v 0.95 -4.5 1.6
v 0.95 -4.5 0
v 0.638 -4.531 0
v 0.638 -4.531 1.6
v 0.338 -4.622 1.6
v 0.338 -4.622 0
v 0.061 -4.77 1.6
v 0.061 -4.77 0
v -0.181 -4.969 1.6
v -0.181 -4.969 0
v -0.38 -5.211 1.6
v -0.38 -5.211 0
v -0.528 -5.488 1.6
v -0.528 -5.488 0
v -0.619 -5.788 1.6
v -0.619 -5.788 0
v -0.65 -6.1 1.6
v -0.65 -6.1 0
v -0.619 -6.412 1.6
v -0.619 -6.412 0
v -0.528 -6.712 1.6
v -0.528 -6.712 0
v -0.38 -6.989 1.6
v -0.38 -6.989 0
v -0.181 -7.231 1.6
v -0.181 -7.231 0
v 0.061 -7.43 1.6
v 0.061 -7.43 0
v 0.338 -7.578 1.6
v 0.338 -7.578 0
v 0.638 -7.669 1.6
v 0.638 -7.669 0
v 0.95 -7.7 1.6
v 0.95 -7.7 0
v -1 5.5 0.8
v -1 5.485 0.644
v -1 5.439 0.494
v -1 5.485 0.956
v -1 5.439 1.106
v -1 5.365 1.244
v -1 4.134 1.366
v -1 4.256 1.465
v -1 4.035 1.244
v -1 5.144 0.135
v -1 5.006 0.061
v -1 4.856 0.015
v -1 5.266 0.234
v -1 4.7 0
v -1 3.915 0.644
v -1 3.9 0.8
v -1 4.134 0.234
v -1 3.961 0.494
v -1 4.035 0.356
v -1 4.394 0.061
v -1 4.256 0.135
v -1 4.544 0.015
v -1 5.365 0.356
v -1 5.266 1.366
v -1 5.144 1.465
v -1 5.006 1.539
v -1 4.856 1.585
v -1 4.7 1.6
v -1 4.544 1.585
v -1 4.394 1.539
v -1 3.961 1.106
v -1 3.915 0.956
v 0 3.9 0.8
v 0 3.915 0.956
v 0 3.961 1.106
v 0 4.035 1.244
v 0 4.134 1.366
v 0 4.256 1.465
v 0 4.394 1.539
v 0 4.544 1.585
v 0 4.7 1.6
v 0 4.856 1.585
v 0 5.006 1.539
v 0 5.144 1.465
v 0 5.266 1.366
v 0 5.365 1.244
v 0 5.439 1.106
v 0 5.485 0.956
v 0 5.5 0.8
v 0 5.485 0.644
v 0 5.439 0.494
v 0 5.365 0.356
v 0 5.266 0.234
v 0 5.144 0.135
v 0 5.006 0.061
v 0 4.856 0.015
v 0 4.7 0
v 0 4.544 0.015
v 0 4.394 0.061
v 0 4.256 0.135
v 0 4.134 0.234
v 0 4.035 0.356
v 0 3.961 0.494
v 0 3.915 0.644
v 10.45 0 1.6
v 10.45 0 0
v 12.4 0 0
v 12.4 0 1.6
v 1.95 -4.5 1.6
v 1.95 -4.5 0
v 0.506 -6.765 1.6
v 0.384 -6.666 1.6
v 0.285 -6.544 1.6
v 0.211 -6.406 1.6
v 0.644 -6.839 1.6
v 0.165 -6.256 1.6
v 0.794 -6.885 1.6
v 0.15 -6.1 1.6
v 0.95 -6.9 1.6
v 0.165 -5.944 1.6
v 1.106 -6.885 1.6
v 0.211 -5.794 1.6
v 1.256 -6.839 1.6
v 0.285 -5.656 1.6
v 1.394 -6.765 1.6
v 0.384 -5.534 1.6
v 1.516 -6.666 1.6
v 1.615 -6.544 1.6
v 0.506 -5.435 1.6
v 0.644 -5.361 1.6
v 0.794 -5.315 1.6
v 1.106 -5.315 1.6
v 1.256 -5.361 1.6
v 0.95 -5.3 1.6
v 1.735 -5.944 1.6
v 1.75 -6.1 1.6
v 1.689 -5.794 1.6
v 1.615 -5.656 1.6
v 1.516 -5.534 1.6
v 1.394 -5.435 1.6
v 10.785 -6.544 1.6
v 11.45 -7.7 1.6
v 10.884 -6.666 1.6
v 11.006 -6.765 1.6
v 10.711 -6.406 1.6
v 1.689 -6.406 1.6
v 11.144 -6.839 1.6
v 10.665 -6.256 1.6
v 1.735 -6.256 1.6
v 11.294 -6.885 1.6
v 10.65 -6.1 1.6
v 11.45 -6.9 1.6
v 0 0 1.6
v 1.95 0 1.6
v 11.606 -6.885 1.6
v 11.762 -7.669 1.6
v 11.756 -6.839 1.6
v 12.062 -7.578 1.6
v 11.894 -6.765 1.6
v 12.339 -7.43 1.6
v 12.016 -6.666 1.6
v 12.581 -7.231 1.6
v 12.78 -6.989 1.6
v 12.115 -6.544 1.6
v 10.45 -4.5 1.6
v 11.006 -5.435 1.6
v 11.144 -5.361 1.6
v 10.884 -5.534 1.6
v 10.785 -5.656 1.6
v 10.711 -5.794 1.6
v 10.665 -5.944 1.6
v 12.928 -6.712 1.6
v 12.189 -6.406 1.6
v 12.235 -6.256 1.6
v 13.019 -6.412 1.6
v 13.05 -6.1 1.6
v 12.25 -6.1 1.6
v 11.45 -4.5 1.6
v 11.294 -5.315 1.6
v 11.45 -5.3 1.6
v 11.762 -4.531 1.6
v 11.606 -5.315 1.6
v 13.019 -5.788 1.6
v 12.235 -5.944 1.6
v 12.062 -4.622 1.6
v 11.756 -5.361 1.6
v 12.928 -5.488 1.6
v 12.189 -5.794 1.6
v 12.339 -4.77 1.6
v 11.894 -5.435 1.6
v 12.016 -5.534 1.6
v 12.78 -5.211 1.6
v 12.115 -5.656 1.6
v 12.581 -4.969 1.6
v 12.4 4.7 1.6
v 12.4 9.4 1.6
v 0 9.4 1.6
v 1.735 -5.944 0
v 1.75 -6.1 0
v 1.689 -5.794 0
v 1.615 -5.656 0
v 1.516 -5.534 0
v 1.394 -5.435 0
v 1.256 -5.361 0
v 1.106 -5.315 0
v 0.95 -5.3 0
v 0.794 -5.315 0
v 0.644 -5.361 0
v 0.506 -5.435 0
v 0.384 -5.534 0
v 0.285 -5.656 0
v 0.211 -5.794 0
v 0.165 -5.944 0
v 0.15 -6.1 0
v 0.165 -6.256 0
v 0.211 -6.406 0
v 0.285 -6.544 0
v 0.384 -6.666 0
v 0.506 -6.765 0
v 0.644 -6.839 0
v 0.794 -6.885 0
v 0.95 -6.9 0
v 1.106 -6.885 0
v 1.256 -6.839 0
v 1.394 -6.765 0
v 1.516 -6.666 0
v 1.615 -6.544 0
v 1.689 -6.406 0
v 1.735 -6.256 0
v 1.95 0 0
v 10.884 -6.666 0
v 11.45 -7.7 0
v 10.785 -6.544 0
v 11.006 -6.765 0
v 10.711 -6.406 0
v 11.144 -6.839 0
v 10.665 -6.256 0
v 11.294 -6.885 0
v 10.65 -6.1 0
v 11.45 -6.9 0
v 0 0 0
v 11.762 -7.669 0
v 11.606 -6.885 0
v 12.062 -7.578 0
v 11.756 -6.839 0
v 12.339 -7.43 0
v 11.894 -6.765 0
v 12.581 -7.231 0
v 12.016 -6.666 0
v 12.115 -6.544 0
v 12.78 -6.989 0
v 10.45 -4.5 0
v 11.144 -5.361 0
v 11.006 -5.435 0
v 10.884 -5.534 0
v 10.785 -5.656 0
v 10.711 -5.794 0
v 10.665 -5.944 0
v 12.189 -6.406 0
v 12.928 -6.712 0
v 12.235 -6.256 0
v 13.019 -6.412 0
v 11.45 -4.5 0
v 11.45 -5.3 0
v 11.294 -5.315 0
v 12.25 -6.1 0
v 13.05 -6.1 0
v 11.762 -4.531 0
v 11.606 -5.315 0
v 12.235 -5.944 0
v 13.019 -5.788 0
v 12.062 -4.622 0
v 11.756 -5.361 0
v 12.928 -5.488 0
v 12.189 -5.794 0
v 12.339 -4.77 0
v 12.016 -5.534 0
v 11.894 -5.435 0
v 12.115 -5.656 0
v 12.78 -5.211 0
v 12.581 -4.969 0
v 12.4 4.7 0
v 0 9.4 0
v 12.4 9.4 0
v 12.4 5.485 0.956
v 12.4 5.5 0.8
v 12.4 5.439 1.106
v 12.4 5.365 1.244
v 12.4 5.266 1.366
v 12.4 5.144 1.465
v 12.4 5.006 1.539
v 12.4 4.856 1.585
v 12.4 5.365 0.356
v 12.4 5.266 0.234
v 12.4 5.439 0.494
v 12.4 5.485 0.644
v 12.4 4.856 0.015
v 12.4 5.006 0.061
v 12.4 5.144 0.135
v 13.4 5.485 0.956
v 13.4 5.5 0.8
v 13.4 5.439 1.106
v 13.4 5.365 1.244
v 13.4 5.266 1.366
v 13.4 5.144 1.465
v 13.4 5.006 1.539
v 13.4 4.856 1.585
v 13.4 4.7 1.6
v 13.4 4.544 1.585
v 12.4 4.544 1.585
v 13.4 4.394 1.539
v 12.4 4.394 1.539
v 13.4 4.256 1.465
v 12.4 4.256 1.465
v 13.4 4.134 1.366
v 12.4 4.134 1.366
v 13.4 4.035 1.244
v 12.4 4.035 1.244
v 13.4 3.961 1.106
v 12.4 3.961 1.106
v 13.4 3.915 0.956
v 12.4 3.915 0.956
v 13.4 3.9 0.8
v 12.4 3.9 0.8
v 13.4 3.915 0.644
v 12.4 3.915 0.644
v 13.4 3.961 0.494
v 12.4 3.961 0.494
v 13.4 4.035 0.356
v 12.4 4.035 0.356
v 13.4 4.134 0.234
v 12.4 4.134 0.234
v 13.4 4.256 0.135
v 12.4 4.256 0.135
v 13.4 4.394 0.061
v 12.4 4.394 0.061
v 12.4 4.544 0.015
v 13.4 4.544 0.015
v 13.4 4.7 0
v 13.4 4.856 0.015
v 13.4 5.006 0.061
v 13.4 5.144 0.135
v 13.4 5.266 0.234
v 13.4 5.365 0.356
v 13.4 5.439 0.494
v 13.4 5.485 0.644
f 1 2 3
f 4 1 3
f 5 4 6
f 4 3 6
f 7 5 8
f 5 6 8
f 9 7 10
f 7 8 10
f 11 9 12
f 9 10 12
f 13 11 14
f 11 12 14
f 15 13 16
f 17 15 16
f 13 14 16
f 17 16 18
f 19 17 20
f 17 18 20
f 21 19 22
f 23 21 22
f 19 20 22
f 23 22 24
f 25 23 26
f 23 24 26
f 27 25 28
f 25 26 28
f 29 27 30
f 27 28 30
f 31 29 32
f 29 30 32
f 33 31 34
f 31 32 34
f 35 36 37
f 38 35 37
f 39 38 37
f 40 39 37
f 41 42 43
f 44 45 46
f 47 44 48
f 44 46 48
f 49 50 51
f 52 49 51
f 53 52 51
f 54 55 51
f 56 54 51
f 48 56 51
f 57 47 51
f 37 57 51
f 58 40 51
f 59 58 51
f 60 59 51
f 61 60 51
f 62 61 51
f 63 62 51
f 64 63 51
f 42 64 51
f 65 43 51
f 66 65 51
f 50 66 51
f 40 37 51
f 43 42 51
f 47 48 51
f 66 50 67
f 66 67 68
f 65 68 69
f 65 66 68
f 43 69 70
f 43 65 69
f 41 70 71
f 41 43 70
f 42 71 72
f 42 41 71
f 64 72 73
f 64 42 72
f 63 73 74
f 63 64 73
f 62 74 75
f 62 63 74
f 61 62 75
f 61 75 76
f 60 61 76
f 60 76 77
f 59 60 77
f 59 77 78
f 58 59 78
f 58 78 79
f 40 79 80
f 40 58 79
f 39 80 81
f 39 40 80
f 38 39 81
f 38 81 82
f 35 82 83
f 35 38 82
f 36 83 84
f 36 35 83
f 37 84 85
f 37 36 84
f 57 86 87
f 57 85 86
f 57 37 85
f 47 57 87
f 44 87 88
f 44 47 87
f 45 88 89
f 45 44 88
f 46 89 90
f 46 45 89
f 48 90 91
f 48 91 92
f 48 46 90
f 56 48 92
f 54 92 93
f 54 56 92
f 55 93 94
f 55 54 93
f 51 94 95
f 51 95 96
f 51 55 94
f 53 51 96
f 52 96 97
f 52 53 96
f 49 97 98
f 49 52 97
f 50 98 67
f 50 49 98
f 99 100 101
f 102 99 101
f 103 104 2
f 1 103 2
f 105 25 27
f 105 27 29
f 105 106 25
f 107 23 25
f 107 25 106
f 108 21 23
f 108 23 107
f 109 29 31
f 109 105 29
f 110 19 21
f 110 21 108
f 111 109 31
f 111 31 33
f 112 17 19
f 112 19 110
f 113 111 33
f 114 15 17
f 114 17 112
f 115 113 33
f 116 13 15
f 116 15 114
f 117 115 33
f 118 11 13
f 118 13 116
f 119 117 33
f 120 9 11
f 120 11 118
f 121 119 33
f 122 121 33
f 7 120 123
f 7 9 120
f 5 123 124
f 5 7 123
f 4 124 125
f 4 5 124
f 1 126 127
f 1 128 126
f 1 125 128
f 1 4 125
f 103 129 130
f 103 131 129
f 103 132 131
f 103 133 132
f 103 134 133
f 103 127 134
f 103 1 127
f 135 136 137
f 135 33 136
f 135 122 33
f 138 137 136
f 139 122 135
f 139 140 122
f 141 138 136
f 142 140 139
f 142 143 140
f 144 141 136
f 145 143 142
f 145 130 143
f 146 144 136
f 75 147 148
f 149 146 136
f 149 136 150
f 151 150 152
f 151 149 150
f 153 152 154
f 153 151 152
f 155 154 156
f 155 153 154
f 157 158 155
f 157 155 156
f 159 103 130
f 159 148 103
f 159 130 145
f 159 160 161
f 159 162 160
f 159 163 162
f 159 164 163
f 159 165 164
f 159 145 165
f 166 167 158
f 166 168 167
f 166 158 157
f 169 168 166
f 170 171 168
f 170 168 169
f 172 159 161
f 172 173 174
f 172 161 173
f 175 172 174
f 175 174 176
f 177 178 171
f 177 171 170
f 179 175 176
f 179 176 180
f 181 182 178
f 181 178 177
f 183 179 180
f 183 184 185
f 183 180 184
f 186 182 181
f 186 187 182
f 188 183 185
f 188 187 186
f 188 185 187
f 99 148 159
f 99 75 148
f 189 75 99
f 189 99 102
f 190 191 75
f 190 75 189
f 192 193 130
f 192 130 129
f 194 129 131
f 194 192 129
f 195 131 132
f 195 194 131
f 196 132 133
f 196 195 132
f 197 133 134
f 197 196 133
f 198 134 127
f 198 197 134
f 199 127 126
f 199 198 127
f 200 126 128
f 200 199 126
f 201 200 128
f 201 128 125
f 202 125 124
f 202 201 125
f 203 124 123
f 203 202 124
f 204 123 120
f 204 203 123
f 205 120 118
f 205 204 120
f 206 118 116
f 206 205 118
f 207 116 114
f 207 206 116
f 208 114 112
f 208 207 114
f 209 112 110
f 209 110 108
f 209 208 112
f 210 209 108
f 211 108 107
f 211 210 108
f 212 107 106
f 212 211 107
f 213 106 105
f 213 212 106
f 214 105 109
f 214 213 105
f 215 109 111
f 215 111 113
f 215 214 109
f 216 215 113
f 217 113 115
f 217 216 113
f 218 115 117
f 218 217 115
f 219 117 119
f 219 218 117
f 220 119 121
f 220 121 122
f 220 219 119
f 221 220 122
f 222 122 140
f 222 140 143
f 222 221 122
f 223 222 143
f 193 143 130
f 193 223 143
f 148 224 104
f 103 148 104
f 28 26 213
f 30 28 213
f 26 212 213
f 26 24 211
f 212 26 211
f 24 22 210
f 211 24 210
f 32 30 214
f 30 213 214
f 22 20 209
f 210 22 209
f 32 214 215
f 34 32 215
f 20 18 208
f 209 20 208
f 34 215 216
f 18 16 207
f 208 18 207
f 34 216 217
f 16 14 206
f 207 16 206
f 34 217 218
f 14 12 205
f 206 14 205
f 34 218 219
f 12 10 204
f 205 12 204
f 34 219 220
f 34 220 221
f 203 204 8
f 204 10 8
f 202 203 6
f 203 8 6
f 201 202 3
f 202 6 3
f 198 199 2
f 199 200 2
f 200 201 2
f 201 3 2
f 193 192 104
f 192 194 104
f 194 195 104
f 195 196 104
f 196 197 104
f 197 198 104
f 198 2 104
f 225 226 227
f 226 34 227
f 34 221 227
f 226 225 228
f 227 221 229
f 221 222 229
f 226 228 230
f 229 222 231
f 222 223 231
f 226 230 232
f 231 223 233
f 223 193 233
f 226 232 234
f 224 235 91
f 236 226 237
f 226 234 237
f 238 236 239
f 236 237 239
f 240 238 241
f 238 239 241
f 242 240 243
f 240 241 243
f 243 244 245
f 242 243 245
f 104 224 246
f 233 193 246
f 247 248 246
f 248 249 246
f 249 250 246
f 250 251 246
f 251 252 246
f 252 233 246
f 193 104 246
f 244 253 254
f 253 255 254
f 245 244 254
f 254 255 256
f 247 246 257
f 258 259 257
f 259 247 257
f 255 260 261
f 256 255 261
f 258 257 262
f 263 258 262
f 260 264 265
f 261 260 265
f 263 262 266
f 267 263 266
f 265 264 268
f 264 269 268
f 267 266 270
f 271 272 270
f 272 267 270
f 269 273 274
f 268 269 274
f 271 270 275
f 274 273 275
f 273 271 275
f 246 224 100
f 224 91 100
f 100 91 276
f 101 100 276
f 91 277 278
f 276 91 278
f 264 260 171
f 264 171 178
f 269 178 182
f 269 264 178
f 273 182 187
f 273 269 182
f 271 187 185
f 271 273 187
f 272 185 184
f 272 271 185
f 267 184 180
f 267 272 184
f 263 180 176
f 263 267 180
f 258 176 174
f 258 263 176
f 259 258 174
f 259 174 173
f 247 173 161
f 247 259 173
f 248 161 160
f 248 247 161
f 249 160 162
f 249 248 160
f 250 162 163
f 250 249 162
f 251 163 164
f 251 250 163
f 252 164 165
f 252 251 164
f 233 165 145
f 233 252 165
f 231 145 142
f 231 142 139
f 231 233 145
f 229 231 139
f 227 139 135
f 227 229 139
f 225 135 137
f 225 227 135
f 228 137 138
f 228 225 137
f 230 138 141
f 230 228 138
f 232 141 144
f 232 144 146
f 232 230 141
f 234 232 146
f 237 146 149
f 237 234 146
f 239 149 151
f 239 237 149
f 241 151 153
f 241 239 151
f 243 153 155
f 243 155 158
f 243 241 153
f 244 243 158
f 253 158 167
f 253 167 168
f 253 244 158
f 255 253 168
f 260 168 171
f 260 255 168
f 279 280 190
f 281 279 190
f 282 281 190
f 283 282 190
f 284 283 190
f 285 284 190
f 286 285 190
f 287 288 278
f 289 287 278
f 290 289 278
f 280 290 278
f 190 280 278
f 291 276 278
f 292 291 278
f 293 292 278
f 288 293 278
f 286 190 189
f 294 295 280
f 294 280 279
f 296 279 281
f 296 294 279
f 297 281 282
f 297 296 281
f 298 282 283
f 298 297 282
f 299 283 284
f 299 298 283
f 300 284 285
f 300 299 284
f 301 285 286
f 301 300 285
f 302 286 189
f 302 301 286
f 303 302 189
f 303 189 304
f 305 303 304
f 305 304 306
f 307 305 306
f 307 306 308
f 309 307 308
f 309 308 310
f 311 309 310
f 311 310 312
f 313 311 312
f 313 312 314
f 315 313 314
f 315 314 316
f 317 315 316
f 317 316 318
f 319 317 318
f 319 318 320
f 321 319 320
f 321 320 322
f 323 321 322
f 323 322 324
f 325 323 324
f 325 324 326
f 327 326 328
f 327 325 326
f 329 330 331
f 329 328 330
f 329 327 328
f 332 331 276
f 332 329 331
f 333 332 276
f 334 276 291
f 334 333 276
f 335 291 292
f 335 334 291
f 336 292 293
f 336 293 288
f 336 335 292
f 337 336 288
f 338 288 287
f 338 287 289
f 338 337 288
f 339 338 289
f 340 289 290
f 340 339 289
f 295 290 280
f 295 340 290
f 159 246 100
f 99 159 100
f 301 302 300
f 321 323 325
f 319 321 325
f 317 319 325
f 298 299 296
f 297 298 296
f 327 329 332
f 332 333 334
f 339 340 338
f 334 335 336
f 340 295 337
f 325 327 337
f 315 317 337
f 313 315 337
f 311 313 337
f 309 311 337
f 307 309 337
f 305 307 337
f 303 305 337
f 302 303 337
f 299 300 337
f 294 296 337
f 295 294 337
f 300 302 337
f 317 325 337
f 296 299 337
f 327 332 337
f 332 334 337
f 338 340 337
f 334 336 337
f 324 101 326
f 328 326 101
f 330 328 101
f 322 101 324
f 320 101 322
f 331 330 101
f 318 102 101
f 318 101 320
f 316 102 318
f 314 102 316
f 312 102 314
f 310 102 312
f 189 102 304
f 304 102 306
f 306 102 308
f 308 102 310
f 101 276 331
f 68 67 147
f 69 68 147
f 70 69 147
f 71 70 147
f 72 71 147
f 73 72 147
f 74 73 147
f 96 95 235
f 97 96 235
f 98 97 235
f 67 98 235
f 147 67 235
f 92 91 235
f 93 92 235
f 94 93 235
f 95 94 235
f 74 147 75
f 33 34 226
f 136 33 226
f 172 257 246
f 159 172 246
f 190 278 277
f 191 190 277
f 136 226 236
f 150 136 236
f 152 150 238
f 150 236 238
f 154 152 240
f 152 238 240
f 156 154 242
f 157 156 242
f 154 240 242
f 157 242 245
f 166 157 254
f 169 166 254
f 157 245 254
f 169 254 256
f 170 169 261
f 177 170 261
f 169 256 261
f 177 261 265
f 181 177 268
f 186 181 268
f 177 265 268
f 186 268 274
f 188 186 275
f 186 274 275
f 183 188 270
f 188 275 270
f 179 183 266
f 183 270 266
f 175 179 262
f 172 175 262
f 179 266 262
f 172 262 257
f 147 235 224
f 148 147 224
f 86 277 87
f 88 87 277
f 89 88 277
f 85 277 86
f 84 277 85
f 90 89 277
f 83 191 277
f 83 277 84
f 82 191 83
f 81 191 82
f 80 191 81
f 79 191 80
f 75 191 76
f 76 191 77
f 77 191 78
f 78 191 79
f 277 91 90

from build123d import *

# Parameters (mm, degrees)
F0_R     = 0.8
F1_DEPTH = 1.6
F2_W     = 3.14566
F2_H     = 3.226229
F2_R     = 0.8
F3_DEPTH = 1
F4_W     = 2.903376
F4_H     = 2.958158
F4_R     = 0.8
F5_DEPTH = 1


with BuildPart() as f1:
    # F0 (on Top) → F1 (new body)
    with BuildSketch(Plane.XY):
        with BuildLine():
            Line((0, 3.9), (0, 0))
            Line((0, 0), (1.95, 0))
            Line((1.95, 0), (1.95, -4.5))
            Line((1.95, -4.5), (0.95, -4.5))
            ThreePointArc((0.95, -4.5), (-0.65, -6.1), (0.95, -7.7))
            Line((0.95, -7.7), (11.45, -7.7))
            ThreePointArc((11.45, -7.7), (13.05, -6.1), (11.45, -4.5))
            Line((11.45, -4.5), (10.45, -4.5))
            Line((10.45, -4.5), (10.45, 0))
            Line((10.45, 0), (12.4, 0))
            Line((12.4, 0), (12.4, 3.9))
            Line((12.4, 3.9), (13.4, 3.9))
            Line((13.4, 3.9), (13.4, 5.5))
            Line((13.4, 5.5), (12.4, 5.5))
            Line((12.4, 5.5), (12.4, 9.4))
            Line((12.4, 9.4), (0, 9.4))
            Line((0, 9.4), (0, 5.5))
            Line((0, 5.5), (-1, 5.5))
            Line((-1, 5.5), (-1, 3.9))
            Line((-1, 3.9), (0, 3.9))
        make_face()
        with Locations((0.95, -6.1)):
            Circle(F0_R, mode=Mode.SUBTRACT)
        with Locations((11.45, -6.1)):
            Circle(F0_R, mode=Mode.SUBTRACT)
    extrude(amount=F1_DEPTH)

    # F2 (on face) → F3 (cut, through all)
    with BuildSketch(Plane(origin=(-1, 0, 0), x_dir=(0, -1, 0), z_dir=(-1, 0, 0))):
        with Locations((-4.643819, 0.893174)):
            Rectangle(F2_W, F2_H)
        with Locations((-4.7, 0.8)):
            Circle(F2_R, mode=Mode.SUBTRACT)
    extrude(amount=-F3_DEPTH, mode=Mode.SUBTRACT)

    # F4 (on face) → F5 (cut, through all)
    with BuildSketch(Plane.YZ.offset(13.4)):
        with Locations((4.745394, 0.737966)):
            Rectangle(F4_W, F4_H)
        with Locations((4.7, 0.8)):
            Circle(F4_R, mode=Mode.SUBTRACT)
    extrude(amount=-F5_DEPTH, mode=Mode.SUBTRACT)


solid = f1.part
